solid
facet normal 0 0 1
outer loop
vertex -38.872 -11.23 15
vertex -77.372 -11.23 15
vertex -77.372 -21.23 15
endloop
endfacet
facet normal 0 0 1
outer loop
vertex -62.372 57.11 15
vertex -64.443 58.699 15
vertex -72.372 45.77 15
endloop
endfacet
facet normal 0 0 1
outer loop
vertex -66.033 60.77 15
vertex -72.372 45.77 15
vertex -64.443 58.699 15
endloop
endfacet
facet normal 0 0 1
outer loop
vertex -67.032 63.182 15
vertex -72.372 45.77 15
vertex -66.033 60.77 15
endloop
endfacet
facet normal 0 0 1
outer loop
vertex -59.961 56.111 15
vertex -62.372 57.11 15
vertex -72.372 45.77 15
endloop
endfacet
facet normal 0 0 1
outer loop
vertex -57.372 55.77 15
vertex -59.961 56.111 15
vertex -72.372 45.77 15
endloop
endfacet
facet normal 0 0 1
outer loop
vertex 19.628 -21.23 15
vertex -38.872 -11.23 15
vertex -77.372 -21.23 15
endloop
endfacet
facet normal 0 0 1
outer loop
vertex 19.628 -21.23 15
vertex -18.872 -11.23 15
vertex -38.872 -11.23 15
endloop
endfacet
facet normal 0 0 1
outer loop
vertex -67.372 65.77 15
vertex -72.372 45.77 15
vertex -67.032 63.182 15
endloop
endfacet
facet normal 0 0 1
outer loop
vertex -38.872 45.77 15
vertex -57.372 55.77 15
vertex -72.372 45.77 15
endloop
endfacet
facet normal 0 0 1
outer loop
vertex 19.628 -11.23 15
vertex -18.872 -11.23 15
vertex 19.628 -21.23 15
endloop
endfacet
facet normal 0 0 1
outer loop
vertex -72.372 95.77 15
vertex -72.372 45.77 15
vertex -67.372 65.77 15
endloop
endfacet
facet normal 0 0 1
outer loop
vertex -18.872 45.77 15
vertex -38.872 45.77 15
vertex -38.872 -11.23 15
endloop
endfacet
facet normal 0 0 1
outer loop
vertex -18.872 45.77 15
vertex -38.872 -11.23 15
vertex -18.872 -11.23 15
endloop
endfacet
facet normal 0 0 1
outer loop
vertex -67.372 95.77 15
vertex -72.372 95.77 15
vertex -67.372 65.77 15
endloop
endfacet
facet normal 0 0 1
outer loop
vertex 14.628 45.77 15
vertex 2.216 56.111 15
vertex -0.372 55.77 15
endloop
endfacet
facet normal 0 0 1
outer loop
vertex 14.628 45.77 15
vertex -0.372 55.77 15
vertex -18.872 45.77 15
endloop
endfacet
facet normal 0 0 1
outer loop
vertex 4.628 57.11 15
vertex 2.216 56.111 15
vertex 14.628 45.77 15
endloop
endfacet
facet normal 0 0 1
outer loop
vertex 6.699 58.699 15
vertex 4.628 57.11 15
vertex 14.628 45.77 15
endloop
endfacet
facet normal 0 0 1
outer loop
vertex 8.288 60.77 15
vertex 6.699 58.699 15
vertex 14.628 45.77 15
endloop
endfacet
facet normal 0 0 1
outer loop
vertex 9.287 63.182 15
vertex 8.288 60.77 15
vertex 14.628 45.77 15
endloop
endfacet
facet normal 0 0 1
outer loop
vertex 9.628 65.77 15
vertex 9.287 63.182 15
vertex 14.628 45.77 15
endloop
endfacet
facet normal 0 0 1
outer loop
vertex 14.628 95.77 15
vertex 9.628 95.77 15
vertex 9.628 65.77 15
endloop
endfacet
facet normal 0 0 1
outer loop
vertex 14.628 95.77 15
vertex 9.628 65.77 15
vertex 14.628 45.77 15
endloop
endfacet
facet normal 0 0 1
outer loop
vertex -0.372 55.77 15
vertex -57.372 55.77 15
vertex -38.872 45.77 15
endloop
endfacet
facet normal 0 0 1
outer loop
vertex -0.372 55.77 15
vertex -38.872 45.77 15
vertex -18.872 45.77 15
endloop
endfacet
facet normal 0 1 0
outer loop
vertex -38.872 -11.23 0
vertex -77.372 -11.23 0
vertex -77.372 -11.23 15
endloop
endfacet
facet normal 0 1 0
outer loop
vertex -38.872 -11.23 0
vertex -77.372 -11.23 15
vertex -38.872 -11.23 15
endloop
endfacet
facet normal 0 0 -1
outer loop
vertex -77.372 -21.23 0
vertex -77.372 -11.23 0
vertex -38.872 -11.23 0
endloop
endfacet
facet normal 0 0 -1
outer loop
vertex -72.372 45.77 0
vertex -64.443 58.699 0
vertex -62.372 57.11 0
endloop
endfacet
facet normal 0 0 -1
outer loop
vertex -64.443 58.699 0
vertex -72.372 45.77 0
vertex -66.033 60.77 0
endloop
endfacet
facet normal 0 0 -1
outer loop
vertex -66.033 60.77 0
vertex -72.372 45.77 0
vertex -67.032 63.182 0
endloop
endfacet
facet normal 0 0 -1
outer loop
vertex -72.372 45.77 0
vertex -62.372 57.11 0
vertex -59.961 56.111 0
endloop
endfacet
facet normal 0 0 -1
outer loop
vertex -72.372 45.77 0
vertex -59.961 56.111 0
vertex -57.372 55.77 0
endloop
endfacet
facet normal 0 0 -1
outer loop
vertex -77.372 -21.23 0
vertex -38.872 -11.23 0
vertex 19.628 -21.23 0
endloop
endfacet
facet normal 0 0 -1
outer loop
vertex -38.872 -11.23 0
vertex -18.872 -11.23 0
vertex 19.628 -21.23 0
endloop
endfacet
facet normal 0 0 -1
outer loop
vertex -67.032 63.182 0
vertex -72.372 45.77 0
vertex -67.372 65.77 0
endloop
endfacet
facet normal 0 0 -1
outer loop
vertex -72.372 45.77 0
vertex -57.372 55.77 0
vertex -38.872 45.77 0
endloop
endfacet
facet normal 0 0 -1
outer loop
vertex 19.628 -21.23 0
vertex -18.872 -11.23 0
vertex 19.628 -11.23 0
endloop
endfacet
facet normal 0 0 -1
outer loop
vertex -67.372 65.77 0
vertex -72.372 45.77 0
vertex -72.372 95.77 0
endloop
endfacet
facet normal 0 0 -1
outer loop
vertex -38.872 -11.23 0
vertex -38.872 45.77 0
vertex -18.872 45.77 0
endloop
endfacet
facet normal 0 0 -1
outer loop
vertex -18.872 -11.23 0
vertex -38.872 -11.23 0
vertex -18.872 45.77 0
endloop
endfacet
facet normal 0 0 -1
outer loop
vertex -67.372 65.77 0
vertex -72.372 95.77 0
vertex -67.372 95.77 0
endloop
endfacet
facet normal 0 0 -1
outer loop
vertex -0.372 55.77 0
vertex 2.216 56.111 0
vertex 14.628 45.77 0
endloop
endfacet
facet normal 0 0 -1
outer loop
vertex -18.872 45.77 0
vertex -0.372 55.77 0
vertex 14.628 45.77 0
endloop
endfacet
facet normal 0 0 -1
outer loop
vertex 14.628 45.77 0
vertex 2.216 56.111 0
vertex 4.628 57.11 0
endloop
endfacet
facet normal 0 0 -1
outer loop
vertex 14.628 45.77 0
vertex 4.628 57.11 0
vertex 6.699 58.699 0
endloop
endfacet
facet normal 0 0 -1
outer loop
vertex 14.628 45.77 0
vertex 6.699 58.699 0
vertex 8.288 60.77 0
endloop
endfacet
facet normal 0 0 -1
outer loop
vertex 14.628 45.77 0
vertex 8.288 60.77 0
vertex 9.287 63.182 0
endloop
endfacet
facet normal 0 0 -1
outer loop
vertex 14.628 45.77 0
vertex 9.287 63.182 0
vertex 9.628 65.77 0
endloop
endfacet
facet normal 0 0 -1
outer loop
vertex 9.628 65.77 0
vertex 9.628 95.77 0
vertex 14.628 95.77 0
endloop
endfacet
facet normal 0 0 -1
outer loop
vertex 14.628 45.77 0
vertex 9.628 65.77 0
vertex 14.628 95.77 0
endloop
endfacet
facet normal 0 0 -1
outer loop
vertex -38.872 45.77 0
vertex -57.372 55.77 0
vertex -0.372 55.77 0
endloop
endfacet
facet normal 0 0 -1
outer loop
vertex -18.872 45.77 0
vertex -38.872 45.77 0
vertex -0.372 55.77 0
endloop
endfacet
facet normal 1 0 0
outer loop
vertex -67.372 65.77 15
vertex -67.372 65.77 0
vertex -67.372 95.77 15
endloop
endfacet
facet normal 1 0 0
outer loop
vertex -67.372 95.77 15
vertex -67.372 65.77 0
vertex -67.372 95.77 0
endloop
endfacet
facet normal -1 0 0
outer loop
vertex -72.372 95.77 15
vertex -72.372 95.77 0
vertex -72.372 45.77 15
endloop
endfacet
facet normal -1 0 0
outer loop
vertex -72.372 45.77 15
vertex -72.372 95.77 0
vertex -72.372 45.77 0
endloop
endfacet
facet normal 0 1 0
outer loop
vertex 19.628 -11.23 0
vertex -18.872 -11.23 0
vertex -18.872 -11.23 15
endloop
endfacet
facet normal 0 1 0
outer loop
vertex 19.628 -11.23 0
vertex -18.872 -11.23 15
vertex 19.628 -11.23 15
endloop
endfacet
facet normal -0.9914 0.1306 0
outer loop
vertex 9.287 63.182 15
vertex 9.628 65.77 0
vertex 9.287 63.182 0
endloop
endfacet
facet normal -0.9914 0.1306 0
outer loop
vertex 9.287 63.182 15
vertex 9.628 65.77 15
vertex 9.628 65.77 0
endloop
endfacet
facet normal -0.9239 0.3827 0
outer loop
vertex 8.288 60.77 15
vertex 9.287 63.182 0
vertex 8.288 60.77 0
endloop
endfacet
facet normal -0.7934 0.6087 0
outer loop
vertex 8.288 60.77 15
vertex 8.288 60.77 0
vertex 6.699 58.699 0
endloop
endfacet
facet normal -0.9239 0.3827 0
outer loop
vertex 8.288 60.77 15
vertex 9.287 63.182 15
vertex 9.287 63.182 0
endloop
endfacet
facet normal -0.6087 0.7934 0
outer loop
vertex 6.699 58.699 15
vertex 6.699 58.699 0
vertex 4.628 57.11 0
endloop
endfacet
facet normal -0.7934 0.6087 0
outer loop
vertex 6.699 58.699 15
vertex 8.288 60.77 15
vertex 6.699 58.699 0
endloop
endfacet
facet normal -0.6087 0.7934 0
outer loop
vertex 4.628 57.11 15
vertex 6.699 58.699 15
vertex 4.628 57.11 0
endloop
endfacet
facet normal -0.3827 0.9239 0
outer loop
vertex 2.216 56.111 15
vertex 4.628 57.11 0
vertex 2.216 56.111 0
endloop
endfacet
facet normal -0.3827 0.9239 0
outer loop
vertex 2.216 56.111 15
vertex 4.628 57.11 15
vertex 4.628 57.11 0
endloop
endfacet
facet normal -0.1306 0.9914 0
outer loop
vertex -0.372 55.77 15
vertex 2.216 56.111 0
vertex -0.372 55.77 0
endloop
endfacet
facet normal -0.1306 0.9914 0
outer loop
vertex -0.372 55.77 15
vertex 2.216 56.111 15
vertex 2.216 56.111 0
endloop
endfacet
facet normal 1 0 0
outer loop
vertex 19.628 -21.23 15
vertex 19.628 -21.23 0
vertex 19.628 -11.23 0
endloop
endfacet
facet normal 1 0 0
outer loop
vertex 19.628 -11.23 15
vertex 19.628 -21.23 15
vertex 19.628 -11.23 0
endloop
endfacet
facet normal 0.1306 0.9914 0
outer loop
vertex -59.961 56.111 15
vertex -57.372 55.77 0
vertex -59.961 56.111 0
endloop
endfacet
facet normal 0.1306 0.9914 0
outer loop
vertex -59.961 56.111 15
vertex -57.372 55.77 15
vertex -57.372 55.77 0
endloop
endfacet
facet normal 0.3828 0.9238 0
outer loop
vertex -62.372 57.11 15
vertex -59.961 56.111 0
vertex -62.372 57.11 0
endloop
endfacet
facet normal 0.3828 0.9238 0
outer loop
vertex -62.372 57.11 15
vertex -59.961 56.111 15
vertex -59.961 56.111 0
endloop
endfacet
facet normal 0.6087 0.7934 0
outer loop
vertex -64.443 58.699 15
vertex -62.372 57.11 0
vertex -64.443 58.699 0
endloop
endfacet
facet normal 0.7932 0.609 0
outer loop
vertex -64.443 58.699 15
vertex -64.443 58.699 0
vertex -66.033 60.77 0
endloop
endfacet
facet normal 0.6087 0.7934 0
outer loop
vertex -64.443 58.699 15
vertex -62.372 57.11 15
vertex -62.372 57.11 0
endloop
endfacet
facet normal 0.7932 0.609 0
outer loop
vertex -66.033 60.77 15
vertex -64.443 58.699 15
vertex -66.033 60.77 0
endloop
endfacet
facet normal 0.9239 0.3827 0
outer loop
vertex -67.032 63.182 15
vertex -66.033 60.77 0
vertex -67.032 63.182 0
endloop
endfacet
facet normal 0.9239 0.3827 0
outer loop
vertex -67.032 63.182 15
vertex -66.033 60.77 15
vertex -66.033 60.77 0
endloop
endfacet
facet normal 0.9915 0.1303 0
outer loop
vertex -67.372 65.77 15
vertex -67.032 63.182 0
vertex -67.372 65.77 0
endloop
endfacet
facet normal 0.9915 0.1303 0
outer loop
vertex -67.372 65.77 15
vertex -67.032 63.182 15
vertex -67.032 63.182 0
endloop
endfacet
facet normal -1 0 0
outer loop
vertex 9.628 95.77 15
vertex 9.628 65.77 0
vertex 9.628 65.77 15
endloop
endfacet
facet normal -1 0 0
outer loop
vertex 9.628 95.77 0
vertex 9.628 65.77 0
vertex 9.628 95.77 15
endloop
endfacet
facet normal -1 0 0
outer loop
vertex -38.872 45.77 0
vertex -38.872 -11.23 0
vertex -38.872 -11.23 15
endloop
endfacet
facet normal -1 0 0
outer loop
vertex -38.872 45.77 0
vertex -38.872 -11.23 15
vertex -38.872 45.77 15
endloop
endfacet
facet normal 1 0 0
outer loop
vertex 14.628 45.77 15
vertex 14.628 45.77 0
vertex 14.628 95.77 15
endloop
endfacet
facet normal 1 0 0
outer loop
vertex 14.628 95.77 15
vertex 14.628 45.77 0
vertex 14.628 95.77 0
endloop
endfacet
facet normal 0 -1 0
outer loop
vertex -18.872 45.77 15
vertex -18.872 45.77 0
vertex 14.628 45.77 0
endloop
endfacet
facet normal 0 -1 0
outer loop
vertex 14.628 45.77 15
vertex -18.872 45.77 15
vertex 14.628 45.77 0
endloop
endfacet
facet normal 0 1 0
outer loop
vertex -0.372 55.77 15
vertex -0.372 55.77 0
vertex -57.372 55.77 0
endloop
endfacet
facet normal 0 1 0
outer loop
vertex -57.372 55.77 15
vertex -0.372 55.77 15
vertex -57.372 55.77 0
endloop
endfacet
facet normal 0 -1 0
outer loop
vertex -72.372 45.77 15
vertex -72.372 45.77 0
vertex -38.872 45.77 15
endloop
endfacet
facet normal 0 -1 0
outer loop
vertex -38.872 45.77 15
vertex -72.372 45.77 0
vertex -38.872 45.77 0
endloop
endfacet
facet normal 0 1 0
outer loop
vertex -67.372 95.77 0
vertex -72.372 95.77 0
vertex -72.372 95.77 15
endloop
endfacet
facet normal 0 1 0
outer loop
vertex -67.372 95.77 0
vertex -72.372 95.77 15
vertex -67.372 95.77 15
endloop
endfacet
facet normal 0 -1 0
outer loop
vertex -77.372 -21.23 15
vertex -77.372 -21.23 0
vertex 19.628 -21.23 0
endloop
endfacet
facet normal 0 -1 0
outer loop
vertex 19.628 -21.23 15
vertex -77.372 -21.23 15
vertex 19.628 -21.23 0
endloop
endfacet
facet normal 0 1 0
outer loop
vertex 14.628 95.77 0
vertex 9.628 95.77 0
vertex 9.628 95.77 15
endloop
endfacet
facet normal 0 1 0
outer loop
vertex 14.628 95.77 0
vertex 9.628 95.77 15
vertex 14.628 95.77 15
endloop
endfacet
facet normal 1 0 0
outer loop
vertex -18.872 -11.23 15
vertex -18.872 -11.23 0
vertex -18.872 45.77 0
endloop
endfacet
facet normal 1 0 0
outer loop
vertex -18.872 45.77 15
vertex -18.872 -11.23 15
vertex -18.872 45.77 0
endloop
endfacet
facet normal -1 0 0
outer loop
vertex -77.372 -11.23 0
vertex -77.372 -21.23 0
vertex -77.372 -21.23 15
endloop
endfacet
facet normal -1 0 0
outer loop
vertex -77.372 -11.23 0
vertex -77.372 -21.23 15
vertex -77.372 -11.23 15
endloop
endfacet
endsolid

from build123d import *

# Parameters (mm, degrees)
SKETCH_1_W      = 5
SKETCH_1_H      = 40
SKETCH_1_W_2    = 20
SKETCH_1_H_2    = 57
SKETCH_1_W_3    = 97
SKETCH_1_H_3    = 10
EXTRUDE_1_DEPTH = 15
FILLET_1_R      = 10


with BuildPart() as part:
    # 草圖1 → 填料-伸長1 (new body)
    with BuildSketch(Plane.XY):
        with Locations((-69.872316496, 75.770491803)):
            Rectangle(SKETCH_1_W, SKETCH_1_H)
        Polygon((-72.372316496, 45.770491803), (-38.872316496, 45.770491803), (-18.872316496, 45.770491803), (14.627683504, 45.770491803), (14.627683504, 55.770491803), (9.627683504, 55.770491803), (-67.372316496, 55.770491803), (-72.372316496, 55.770491803), align=None)
        with Locations((12.127683504, 75.770491803)):
            Rectangle(SKETCH_1_W, SKETCH_1_H)
        with Locations((-28.872316496, 17.270491803)):
            Rectangle(SKETCH_1_W_2, SKETCH_1_H_2)
        with Locations((-28.872316496, -16.229508197)):
            Rectangle(SKETCH_1_W_3, SKETCH_1_H_3)
    extrude(amount=EXTRUDE_1_DEPTH)

    # 圓角1
    fillet_1_edges = [part.edges().sort_by_distance(p)[0] for p in [
        (-67.372316496, 55.770491803, 7.5),
        (9.627683504, 55.770491803, 7.5),
    ]]
    fillet(fillet_1_edges, radius=FILLET_1_R)


solid = part.part
